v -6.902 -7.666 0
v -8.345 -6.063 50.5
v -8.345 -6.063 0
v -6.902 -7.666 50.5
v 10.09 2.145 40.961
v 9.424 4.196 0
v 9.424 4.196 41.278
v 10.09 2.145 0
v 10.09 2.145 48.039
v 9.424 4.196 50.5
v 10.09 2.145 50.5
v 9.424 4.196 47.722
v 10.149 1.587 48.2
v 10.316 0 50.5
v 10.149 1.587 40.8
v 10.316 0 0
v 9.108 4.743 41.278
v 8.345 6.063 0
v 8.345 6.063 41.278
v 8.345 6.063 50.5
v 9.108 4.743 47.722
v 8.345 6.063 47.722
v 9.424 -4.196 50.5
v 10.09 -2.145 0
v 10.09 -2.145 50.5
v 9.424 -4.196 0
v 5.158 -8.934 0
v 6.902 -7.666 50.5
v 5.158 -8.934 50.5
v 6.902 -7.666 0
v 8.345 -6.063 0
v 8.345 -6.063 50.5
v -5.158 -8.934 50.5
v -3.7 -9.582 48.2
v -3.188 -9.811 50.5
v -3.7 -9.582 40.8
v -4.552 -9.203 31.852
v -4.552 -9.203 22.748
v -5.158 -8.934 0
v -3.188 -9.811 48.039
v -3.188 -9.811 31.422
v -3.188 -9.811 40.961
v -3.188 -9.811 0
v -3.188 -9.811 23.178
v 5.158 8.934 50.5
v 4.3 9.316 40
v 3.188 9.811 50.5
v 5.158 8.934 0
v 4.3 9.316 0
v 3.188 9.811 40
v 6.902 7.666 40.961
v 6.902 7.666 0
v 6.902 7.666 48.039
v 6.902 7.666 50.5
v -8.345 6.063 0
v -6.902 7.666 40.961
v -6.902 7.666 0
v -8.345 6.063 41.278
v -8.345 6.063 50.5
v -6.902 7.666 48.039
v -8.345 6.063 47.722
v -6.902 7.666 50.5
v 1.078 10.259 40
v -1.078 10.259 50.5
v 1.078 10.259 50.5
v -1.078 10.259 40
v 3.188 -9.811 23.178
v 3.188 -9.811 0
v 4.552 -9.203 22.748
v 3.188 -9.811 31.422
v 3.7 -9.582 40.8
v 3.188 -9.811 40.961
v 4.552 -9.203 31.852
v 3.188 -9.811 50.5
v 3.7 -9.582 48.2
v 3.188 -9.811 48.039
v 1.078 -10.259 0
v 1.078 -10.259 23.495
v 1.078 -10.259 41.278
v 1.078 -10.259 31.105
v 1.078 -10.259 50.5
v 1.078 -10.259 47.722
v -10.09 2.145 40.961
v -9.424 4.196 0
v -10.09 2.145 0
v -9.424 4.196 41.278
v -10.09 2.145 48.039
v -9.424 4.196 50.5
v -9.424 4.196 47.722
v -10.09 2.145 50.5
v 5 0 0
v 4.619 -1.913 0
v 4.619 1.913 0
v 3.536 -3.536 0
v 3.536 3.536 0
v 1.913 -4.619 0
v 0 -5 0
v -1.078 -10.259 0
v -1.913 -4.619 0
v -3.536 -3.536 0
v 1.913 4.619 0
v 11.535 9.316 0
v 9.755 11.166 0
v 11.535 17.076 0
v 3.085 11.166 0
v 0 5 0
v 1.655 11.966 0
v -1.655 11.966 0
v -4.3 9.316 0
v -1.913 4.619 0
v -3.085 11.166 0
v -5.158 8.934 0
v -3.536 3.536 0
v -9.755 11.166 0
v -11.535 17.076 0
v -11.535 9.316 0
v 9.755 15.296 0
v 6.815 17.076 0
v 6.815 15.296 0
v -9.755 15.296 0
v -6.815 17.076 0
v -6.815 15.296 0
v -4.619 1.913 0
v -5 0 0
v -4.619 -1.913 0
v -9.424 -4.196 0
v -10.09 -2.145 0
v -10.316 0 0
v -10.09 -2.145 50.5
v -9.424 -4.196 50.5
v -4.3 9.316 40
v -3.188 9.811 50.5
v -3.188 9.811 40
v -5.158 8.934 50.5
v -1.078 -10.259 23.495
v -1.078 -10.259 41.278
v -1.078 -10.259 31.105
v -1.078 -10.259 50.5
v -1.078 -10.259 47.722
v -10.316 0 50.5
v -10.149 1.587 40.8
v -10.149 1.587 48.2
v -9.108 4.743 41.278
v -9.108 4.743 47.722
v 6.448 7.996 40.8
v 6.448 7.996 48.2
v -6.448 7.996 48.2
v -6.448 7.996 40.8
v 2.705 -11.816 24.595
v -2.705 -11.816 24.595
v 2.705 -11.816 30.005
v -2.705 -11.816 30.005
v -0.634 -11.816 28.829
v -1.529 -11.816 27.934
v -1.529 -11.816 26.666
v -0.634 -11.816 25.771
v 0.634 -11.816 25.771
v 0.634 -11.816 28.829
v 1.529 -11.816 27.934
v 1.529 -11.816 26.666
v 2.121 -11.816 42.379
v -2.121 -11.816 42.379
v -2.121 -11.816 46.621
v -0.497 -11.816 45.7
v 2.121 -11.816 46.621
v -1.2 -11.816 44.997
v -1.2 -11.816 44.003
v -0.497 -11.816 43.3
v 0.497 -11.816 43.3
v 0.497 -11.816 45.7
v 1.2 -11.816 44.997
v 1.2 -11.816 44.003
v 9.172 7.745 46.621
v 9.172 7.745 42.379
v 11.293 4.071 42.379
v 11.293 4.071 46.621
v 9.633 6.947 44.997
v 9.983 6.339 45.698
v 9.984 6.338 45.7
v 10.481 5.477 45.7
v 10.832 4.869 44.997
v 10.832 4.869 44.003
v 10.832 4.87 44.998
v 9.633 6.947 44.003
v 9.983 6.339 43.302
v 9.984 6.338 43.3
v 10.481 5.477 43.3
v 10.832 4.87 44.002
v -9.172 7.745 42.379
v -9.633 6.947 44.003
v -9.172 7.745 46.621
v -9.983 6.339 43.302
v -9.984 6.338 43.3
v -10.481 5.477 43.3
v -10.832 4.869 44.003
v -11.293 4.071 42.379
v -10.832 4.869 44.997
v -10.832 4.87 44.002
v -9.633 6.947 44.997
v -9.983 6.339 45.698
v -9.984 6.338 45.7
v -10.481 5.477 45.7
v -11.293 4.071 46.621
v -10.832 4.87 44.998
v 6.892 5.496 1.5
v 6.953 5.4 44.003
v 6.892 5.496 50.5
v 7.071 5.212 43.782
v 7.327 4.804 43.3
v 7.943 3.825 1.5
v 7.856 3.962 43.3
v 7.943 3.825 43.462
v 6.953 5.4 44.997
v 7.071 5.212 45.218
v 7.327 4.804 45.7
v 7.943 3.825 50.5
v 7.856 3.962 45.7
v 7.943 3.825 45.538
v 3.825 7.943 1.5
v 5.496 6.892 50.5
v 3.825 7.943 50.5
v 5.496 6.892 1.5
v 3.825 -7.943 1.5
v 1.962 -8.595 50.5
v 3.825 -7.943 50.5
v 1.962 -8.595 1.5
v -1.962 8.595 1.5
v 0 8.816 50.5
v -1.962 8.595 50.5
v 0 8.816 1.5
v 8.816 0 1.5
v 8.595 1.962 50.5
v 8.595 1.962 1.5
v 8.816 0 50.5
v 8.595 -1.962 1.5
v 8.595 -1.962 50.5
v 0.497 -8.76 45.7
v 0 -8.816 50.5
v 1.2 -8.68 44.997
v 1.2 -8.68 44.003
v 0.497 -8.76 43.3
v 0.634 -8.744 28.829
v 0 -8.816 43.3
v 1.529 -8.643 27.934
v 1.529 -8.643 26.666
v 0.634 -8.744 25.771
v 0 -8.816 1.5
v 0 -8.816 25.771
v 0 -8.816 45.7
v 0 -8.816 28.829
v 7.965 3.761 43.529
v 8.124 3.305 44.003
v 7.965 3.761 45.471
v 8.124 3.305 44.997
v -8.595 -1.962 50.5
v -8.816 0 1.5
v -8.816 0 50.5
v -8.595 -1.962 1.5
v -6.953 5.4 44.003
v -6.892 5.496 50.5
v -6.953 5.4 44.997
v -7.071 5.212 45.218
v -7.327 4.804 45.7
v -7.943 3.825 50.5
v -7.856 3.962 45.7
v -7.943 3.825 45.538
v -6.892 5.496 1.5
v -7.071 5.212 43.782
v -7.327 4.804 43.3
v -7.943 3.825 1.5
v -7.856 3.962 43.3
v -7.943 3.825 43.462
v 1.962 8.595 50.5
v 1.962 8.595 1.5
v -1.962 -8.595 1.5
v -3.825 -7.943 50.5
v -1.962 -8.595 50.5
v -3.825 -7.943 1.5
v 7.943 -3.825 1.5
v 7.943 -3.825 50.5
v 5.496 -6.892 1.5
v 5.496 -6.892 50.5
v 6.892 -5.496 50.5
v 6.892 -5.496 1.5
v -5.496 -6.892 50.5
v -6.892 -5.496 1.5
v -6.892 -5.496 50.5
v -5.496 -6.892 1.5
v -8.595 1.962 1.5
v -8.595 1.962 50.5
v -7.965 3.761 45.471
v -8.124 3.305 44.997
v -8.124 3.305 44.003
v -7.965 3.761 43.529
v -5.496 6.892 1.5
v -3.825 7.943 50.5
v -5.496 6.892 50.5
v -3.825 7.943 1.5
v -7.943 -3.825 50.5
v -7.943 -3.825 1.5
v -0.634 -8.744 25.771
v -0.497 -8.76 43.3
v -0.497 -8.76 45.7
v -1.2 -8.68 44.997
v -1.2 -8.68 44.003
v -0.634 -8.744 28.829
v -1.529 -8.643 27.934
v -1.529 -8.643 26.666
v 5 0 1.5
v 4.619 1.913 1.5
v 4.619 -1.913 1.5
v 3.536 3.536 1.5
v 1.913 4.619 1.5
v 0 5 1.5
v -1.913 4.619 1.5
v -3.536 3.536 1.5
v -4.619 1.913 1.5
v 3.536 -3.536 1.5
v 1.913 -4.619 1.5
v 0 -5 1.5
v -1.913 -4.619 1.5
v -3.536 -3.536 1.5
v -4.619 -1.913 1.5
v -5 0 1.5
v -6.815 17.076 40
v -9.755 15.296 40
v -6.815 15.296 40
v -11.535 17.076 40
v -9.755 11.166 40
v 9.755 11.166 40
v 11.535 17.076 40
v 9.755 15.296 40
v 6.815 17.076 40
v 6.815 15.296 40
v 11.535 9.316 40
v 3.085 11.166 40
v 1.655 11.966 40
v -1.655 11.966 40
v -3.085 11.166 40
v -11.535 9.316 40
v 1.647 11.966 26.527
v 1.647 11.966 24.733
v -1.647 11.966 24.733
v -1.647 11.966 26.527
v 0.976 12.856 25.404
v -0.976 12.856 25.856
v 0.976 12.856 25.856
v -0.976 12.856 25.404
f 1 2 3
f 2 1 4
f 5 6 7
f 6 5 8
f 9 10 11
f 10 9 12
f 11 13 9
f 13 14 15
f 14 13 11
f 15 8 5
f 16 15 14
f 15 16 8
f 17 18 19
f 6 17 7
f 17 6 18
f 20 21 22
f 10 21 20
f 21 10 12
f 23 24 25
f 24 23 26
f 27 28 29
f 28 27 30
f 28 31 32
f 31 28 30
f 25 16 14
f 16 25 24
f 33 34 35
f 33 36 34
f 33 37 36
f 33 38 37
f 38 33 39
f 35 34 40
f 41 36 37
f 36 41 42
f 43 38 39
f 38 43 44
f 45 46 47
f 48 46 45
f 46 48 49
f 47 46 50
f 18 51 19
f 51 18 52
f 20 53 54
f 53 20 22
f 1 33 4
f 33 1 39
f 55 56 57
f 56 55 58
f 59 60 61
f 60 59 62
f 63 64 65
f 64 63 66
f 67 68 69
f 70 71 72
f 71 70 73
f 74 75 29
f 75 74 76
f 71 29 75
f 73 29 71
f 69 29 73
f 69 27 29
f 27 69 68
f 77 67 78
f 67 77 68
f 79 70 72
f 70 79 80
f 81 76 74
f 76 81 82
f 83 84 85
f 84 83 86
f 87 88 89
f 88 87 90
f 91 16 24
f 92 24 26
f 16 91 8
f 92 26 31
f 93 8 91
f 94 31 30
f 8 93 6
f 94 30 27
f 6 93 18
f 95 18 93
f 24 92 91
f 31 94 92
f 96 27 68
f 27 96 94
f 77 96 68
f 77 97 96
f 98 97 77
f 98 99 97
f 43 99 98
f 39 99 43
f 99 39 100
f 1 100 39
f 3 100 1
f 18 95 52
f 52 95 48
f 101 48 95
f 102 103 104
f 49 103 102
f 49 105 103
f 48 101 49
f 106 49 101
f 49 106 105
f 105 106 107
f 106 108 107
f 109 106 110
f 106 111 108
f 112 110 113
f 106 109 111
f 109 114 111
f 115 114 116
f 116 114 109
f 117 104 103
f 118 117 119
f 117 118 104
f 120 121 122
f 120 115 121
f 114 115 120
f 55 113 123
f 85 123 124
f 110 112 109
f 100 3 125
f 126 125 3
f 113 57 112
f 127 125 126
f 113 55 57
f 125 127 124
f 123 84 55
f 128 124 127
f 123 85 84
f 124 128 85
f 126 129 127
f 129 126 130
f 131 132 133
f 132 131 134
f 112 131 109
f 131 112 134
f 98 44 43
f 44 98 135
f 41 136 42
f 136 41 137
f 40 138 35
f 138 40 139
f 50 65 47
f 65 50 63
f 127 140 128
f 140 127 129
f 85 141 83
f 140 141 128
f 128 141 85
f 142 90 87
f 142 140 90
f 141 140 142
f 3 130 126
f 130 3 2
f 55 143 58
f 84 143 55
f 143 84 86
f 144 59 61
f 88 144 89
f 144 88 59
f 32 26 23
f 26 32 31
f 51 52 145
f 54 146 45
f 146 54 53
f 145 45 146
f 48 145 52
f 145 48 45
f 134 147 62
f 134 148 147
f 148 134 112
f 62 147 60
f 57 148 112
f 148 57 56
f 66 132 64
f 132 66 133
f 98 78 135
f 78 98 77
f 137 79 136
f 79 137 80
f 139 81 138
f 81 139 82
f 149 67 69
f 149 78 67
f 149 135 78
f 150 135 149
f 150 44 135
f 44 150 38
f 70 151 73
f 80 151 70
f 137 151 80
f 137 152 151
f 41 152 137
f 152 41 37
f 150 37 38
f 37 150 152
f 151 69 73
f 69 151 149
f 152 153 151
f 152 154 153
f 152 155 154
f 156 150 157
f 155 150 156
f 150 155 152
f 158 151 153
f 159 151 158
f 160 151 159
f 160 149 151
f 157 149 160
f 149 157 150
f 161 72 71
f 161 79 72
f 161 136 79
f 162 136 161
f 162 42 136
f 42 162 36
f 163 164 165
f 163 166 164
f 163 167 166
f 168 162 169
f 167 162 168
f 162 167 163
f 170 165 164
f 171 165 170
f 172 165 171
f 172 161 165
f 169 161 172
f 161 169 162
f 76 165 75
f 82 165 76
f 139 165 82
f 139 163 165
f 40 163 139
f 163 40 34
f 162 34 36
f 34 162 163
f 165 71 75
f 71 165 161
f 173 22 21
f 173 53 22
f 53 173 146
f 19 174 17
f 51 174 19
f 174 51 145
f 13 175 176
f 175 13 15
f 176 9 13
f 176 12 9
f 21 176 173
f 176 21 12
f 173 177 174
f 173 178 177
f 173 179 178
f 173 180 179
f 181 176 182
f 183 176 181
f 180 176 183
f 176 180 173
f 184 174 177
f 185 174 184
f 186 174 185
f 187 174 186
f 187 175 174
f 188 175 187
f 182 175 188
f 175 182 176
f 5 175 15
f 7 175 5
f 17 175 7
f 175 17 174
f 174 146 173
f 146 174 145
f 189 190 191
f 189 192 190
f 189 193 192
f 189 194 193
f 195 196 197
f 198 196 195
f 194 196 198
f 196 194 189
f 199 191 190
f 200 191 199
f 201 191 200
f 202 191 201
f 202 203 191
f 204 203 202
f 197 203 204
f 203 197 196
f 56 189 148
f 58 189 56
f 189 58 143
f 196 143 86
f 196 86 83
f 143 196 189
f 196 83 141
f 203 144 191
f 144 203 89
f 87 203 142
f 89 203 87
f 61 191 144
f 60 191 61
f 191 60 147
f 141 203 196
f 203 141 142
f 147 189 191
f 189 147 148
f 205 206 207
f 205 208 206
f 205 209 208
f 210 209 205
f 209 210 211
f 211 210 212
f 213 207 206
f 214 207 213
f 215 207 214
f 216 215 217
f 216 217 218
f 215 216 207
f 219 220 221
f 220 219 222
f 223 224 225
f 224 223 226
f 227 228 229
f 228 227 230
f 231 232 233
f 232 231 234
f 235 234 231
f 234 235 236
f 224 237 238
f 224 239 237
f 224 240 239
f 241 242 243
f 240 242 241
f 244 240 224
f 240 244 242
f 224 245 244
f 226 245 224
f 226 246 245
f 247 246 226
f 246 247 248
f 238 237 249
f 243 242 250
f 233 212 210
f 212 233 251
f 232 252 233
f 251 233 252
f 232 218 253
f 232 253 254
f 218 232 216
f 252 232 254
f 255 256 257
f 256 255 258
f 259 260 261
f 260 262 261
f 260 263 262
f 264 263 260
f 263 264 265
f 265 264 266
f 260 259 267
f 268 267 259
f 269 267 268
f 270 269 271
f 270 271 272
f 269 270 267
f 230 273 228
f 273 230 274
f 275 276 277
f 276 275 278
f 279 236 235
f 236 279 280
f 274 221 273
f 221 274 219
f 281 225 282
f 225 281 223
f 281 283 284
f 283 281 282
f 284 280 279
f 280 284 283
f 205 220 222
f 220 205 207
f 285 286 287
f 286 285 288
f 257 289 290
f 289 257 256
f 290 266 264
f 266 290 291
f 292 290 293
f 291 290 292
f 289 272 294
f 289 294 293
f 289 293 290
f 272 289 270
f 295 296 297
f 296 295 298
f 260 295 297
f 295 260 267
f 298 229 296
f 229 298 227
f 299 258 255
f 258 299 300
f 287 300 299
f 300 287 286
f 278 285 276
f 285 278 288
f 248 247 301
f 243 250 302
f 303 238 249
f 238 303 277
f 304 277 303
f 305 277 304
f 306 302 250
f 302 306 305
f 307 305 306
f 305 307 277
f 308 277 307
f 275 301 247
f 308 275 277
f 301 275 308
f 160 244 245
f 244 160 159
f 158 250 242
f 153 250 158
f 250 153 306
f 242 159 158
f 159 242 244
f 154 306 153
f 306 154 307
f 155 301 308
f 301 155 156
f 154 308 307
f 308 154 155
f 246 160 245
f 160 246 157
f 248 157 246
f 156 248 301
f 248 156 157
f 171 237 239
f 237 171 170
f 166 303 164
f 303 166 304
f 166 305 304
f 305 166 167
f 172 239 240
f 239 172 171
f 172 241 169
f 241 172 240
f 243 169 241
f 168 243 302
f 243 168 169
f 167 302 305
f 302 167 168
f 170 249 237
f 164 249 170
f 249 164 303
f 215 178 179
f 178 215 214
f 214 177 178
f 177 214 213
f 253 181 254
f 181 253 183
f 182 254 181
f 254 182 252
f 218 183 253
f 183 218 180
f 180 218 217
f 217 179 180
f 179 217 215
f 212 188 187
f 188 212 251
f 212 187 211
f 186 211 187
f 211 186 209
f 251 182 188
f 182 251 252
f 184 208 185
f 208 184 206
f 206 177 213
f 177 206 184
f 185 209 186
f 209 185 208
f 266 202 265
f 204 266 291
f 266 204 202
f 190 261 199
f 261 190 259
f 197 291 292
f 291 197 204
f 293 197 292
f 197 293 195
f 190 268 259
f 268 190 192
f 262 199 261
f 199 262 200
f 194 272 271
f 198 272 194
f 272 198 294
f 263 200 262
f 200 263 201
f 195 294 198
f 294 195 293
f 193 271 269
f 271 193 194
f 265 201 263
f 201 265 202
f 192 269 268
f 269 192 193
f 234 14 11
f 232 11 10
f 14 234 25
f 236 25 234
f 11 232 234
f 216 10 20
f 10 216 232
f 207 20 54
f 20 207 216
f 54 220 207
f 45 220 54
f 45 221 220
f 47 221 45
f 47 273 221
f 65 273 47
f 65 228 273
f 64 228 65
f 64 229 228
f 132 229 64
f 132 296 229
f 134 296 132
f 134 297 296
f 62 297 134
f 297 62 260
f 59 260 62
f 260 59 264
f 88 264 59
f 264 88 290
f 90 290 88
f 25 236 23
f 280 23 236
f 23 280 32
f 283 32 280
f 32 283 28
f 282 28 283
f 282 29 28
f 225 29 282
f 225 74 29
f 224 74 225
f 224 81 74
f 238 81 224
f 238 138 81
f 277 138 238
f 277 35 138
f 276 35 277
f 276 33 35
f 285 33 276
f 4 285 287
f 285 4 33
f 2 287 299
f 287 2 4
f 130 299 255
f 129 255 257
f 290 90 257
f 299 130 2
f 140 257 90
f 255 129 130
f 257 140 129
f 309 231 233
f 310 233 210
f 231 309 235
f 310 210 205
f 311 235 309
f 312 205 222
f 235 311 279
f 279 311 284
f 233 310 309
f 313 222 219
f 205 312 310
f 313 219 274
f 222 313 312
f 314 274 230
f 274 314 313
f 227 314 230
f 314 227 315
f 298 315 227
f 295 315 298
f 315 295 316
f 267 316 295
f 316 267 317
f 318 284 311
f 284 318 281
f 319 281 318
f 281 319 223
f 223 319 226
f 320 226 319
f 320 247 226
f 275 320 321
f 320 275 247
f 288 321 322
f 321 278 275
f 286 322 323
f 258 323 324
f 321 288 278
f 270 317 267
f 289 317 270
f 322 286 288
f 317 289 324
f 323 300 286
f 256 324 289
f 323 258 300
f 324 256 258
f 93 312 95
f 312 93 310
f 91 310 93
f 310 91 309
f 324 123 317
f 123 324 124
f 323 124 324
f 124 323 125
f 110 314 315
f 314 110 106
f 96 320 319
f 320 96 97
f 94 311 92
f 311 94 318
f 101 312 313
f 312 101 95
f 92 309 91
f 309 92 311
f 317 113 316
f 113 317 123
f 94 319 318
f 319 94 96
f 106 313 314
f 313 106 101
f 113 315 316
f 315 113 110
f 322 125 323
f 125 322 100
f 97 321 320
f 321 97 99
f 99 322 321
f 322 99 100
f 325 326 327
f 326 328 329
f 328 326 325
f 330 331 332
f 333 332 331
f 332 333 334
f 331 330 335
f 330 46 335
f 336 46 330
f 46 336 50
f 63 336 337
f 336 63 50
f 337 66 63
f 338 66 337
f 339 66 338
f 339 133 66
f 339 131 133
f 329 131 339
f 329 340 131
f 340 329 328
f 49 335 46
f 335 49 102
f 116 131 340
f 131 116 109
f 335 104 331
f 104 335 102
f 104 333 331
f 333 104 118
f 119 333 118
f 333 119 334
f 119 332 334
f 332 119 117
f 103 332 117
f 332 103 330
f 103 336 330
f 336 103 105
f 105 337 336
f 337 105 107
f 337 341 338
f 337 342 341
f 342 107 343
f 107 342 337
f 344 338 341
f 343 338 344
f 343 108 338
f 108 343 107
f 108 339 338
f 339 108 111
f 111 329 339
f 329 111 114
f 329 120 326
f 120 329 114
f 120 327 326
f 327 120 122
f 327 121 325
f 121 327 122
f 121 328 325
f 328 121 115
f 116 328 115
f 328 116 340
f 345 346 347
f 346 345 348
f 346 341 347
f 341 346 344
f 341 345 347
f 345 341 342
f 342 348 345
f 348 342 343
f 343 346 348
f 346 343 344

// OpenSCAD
railTolerance = 0.63;

laserDiameter = 10;
wallThickness = 1.5;
lowerLipThickness = 1.5;
laserButtonStickout = 1.85; // distance button sticks out of tube
laserButtonDistanceFromBottomOfLaser = 29.3;
laserButtonScrewDiameter = 3.06; 
backStickout = 2; // how far laser will stick out of tube

clipLength = 30; 
clipWallThickness = 1;
blowgunDiameter = 15.9;

adjustmentRatio = 0.072;
adjustmentScrewDistance = 44.5;
adjustmentScrewDiameter = 2.4; 

laserButtonDistance = laserButtonDistanceFromBottomOfLaser - backStickout;
totalLength = adjustmentScrewDistance + 6;

tubeInnerRadius = laserDiameter/2 + laserButtonStickout + laserButtonDistance * adjustmentRatio;


nudge = 0.01;

module screw(height, angle, diameter, positive) {
    translate([0,0,height]) rotate([90,0,angle]) translate([0,0,tubeInnerRadius-wallThickness])
    if(positive) {
        rotate([0,0,45])
        cylinder(d2=diameter*2.5,d1=diameter*2.5+6*wallThickness,h=3*wallThickness,$fn=4);
    }
    else {
        rotate([0,0,22.5])
        translate([0,0,-nudge]) cylinder(d=diameter*1.082,h=3*wallThickness+2*nudge,$fn=8);
    }
}

module tube() {
    render(convexity=8)
    difference() {
        union() {
            cylinder(h=totalLength+nudge, r=tubeInnerRadius+wallThickness);
            screw(laserButtonDistance, 0, laserButtonScrewDiameter,true);
            screw(adjustmentScrewDistance, 0, adjustmentScrewDiameter,true);
            screw(adjustmentScrewDistance, 120, adjustmentScrewDiameter,true);
            screw(adjustmentScrewDistance, -120, adjustmentScrewDiameter,true);
        }
        translate([0,0,-nudge]) cylinder(h=totalLength+2*nudge, r=tubeInnerRadius);
            screw(laserButtonDistance, 0, laserButtonScrewDiameter,false);
            screw(adjustmentScrewDistance, 0, adjustmentScrewDiameter,false);
            screw(adjustmentScrewDistance, 120, adjustmentScrewDiameter,false);
            screw(adjustmentScrewDistance, -120, adjustmentScrewDiameter,false);
            translate([0,0,totalLength]) cylinder(h=30, r=tubeInnerRadius+wallThickness);
    } 

    render(convexity=8)
    difference() {
        cylinder(h=lowerLipThickness, r=tubeInnerRadius+nudge);
        translate([0,0,-nudge]) cylinder(h=lowerLipThickness+2*nudge, d=laserDiameter);
    }
}

module clip() {
    render(convexity=5)
    translate([0,blowgunDiameter/2+clipWallThickness,0])
    difference() {
                cylinder(h=clipLength,d=blowgunDiameter+2*clipWallThickness);
        translate([0,blowgunDiameter*.85,clipLength]) rotate([-45,0,0])
        cube(center=true,blowgunDiameter+2*clipWallThickness);
translate([0,0,clipLength-clipWallThickness+nudge]) cylinder(h=clipWallThickness,d1=blowgunDiameter,d2=blowgunDiameter+2*clipWallThickness);
        translate([0,0,-nudge]) {
            cylinder(h=clipLength+2*nudge,d=blowgunDiameter);
            translate([0,1.5*(clipWallThickness+blowgunDiameter/2),0]) linear_extrude(height=clipLength+2*nudge) square(center=true, blowgunDiameter+2*clipWallThickness+2*nudge);
        }
    }
}


module nerfRail(positive=false,length=40,tolerance=0.25) {
    outerWidth = 18.25;
    outerThickness = 2.87;
    valleyDepth = 1.43;
    shoulderWidth = 5.41;
    nubDistanceFromFront = 15;
    nubSize=1.81;
    nubThickness=.9;
    overhang = 2.94;
    outerDepth = 3.56;
    nudge = 0.01;
        
    // positive tolerance makes it larger
    module positiveRailProfile(tolerance=0) {
    points=[[-outerWidth/2-tolerance+overhang,0],
        [-outerWidth/2-tolerance+overhang,outerDepth-tolerance],
        [-outerWidth/2-tolerance,outerDepth-tolerance],
        [-outerWidth/2-tolerance,outerDepth+outerThickness+tolerance],
        [-outerWidth/2+shoulderWidth+tolerance,outerDepth+outerThickness+tolerance],
        [-outerWidth/2+shoulderWidth+tolerance+valleyDepth,
        outerDepth+outerThickness+tolerance-valleyDepth+tolerance],
        [nudge,
        outerDepth+outerThickness+tolerance-valleyDepth+tolerance],
        [nudge,0]    
        ];

        union() {
            polygon(points=points);
            scale([-1,1,1]) polygon(points=points);
        }
    }

    module negativeRailProfile(tolerance=0.25) {
        translate([0,-outerDepth/2+tolerance])
        render(convexity=3) difference() {
            translate([-tolerance-outerWidth/2-outerDepth/2,outerDepth/2-tolerance]) square([outerWidth+outerDepth+2*tolerance,overhang+outerDepth+2*tolerance]);
            positiveRailProfile(tolerance=tolerance);
        }
        
        
    }
    
    module nub() {
        hull() {
        translate([-outerWidth/2+shoulderWidth+tolerance+valleyDepth+nubSize/2,0,0])
        rotate([90,0,0])
        linear_extrude(height=nubThickness,scale=0.25)
        square(nubSize,center=true);
        translate(-[-outerWidth/2+shoulderWidth+tolerance+valleyDepth+nubSize/2,0,0])
        rotate([90,0,0])
        linear_extrude(height=nubThickness,scale=0.25)
        square(nubSize,center=true);
        }
    }
        
    if (positive) {
        linear_extrude(height=length)
        positiveRailProfile(tolerance=-tolerance);
    }
    else {
        translate(-[0,overhang+outerDepth+2*tolerance,0]) {
        linear_extrude(height=length)
        negativeRailProfile(tolerance=tolerance);
        translate([0,(outerDepth+outerThickness+3*tolerance-valleyDepth)-outerDepth/2+nudge,length-nubDistanceFromFront+tolerance])
        nub();
        }
    }
  
}


tube();
translate([0,tubeInnerRadius+wallThickness-clipWallThickness,0])
rotate([0,0,180])
nerfRail(tolerance=railTolerance);
